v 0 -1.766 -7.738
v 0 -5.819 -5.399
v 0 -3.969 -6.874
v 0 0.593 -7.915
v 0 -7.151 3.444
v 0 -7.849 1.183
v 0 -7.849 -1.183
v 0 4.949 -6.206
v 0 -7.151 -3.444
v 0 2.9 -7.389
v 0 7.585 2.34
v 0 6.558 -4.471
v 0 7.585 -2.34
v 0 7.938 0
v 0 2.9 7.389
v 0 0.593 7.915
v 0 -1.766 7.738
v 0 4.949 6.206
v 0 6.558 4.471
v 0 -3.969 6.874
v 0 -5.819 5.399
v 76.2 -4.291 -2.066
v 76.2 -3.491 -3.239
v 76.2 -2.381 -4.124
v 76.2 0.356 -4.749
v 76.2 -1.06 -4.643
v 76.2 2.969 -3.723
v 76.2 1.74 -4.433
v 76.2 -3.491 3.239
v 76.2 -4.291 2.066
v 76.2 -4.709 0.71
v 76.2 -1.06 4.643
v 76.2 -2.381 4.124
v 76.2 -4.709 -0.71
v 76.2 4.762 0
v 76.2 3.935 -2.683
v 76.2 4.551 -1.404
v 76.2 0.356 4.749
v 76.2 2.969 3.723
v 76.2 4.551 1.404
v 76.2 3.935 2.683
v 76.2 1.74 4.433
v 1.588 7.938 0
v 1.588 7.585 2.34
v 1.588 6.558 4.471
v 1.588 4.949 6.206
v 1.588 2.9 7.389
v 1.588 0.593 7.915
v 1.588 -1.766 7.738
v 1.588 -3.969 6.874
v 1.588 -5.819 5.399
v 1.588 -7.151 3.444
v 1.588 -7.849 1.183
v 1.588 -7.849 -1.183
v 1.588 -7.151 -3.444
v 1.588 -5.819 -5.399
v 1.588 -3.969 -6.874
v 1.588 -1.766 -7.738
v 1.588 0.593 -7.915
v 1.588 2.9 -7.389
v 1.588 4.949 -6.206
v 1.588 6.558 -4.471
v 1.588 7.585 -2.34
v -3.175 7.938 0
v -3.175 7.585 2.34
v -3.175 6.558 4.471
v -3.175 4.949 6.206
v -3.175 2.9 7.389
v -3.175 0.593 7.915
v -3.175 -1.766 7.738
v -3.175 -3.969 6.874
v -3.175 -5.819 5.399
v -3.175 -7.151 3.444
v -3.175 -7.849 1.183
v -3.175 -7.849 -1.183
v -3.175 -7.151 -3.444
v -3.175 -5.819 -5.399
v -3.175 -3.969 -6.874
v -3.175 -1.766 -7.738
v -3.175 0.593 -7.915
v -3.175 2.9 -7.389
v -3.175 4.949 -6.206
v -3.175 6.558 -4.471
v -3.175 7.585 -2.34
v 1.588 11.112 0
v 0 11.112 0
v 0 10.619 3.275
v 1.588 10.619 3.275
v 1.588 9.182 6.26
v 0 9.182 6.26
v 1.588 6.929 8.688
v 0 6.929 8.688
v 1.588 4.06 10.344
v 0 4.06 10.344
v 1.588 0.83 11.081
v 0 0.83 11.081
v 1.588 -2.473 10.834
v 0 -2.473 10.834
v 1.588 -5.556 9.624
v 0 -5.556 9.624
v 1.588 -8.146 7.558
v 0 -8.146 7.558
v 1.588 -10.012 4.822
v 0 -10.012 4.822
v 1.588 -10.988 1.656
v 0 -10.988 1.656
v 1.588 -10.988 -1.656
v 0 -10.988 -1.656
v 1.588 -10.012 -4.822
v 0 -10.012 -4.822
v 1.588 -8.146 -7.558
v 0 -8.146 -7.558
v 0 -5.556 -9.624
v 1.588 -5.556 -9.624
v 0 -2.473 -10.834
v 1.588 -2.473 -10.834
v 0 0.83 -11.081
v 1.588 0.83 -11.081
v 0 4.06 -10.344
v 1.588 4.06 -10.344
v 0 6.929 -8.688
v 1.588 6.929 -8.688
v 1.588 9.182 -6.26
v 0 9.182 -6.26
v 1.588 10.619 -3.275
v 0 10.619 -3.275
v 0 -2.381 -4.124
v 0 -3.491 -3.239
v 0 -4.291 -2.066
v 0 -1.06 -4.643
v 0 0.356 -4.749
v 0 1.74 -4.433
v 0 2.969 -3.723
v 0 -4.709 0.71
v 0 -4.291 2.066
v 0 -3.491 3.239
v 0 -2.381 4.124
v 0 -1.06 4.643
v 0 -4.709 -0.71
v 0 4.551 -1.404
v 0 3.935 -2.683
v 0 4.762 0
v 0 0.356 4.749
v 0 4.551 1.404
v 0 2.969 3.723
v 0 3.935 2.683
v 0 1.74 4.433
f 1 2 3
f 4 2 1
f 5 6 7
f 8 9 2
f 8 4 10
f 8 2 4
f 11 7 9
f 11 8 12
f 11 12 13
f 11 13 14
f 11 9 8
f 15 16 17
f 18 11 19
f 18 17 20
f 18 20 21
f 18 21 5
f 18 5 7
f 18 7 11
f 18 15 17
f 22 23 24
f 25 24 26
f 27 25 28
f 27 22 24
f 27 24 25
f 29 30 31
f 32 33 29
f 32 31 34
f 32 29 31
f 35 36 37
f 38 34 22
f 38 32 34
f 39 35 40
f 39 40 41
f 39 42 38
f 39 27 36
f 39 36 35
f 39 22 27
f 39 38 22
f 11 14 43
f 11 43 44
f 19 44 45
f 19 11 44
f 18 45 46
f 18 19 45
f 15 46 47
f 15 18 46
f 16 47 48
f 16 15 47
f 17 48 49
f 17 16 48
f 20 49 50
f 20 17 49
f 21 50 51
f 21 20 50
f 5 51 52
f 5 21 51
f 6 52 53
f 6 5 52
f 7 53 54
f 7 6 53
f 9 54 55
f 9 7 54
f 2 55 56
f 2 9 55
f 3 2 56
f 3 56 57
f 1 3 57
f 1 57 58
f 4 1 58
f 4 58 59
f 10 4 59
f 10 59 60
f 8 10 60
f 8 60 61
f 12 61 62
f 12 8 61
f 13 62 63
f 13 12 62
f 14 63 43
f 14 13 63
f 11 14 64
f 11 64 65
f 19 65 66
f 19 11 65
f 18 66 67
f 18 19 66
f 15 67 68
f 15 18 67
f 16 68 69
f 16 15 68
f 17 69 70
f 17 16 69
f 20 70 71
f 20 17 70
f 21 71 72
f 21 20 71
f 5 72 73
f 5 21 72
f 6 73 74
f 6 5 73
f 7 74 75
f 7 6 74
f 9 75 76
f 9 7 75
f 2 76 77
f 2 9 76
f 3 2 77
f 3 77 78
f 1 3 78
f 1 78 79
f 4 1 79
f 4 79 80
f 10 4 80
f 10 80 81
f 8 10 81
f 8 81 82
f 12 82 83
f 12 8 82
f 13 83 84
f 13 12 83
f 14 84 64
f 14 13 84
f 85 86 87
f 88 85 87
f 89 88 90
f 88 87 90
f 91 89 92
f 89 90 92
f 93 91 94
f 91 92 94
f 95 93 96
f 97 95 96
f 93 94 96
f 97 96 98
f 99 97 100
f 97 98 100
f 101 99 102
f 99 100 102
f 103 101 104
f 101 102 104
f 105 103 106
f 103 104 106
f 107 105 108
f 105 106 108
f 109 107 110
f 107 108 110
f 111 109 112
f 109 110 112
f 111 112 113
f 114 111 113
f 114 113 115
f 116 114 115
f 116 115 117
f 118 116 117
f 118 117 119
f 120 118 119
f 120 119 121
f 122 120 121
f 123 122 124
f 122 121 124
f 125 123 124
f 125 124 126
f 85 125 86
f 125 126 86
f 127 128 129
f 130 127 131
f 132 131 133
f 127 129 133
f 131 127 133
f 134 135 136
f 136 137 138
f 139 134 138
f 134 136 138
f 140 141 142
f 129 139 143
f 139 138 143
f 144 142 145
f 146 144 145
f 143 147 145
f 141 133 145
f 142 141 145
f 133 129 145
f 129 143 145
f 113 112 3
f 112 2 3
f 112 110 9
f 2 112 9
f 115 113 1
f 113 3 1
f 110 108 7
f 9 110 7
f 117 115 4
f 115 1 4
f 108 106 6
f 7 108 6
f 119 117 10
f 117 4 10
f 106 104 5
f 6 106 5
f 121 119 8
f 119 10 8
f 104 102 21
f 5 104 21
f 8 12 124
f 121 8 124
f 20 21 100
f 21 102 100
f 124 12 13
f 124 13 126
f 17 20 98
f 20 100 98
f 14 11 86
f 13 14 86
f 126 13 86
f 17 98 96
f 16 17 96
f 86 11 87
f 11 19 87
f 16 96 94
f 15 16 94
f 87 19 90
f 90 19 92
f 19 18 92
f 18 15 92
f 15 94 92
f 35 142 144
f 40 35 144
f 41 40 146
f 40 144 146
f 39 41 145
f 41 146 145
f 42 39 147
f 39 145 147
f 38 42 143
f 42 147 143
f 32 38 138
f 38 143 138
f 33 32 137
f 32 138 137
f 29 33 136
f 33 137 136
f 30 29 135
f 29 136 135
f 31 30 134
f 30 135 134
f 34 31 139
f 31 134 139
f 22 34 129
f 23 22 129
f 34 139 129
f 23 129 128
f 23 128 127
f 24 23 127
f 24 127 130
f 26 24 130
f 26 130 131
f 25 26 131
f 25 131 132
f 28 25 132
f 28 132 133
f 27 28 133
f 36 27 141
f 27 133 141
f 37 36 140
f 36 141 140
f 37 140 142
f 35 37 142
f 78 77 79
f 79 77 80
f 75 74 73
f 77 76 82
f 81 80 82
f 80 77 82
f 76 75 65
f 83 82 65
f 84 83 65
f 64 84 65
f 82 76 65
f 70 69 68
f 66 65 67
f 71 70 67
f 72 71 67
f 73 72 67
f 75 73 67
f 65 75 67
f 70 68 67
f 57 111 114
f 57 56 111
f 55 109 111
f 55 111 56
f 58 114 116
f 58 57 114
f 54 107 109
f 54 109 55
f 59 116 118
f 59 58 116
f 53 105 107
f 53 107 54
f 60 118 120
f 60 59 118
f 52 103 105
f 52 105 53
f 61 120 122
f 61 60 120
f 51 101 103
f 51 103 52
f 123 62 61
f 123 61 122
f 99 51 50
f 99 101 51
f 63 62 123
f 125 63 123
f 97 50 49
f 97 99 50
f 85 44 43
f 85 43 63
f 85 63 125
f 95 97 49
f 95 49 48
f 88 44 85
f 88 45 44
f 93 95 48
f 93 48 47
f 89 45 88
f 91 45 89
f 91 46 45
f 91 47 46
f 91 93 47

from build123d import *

# Parameters (mm, degrees)
F0_R     = 4.7625
F1_DEPTH = 76.2
F2_R     = 11.1125
F2_R_2   = 7.9375
F3_DEPTH = 1.5875
F4_DEPTH = 3.175


with BuildPart() as f1:
    # F0 (on Right) → F1 (new body)
    with BuildSketch(Plane.YZ):
        Circle(F0_R)
    extrude(amount=F1_DEPTH)


with BuildPart() as f3:
    # F2 (on Right) → F3 (new body)
    with BuildSketch(Plane.YZ):
        Circle(F2_R)
        Circle(F2_R_2, mode=Mode.SUBTRACT)
    extrude(amount=F3_DEPTH)


with BuildPart() as f4:
    # F2 (on Right) → F4 (new body)
    with BuildSketch(Plane.YZ):
        Circle(F2_R_2)
    extrude(amount=-F4_DEPTH)


solid = Compound([f1.part, f3.part, f4.part])
